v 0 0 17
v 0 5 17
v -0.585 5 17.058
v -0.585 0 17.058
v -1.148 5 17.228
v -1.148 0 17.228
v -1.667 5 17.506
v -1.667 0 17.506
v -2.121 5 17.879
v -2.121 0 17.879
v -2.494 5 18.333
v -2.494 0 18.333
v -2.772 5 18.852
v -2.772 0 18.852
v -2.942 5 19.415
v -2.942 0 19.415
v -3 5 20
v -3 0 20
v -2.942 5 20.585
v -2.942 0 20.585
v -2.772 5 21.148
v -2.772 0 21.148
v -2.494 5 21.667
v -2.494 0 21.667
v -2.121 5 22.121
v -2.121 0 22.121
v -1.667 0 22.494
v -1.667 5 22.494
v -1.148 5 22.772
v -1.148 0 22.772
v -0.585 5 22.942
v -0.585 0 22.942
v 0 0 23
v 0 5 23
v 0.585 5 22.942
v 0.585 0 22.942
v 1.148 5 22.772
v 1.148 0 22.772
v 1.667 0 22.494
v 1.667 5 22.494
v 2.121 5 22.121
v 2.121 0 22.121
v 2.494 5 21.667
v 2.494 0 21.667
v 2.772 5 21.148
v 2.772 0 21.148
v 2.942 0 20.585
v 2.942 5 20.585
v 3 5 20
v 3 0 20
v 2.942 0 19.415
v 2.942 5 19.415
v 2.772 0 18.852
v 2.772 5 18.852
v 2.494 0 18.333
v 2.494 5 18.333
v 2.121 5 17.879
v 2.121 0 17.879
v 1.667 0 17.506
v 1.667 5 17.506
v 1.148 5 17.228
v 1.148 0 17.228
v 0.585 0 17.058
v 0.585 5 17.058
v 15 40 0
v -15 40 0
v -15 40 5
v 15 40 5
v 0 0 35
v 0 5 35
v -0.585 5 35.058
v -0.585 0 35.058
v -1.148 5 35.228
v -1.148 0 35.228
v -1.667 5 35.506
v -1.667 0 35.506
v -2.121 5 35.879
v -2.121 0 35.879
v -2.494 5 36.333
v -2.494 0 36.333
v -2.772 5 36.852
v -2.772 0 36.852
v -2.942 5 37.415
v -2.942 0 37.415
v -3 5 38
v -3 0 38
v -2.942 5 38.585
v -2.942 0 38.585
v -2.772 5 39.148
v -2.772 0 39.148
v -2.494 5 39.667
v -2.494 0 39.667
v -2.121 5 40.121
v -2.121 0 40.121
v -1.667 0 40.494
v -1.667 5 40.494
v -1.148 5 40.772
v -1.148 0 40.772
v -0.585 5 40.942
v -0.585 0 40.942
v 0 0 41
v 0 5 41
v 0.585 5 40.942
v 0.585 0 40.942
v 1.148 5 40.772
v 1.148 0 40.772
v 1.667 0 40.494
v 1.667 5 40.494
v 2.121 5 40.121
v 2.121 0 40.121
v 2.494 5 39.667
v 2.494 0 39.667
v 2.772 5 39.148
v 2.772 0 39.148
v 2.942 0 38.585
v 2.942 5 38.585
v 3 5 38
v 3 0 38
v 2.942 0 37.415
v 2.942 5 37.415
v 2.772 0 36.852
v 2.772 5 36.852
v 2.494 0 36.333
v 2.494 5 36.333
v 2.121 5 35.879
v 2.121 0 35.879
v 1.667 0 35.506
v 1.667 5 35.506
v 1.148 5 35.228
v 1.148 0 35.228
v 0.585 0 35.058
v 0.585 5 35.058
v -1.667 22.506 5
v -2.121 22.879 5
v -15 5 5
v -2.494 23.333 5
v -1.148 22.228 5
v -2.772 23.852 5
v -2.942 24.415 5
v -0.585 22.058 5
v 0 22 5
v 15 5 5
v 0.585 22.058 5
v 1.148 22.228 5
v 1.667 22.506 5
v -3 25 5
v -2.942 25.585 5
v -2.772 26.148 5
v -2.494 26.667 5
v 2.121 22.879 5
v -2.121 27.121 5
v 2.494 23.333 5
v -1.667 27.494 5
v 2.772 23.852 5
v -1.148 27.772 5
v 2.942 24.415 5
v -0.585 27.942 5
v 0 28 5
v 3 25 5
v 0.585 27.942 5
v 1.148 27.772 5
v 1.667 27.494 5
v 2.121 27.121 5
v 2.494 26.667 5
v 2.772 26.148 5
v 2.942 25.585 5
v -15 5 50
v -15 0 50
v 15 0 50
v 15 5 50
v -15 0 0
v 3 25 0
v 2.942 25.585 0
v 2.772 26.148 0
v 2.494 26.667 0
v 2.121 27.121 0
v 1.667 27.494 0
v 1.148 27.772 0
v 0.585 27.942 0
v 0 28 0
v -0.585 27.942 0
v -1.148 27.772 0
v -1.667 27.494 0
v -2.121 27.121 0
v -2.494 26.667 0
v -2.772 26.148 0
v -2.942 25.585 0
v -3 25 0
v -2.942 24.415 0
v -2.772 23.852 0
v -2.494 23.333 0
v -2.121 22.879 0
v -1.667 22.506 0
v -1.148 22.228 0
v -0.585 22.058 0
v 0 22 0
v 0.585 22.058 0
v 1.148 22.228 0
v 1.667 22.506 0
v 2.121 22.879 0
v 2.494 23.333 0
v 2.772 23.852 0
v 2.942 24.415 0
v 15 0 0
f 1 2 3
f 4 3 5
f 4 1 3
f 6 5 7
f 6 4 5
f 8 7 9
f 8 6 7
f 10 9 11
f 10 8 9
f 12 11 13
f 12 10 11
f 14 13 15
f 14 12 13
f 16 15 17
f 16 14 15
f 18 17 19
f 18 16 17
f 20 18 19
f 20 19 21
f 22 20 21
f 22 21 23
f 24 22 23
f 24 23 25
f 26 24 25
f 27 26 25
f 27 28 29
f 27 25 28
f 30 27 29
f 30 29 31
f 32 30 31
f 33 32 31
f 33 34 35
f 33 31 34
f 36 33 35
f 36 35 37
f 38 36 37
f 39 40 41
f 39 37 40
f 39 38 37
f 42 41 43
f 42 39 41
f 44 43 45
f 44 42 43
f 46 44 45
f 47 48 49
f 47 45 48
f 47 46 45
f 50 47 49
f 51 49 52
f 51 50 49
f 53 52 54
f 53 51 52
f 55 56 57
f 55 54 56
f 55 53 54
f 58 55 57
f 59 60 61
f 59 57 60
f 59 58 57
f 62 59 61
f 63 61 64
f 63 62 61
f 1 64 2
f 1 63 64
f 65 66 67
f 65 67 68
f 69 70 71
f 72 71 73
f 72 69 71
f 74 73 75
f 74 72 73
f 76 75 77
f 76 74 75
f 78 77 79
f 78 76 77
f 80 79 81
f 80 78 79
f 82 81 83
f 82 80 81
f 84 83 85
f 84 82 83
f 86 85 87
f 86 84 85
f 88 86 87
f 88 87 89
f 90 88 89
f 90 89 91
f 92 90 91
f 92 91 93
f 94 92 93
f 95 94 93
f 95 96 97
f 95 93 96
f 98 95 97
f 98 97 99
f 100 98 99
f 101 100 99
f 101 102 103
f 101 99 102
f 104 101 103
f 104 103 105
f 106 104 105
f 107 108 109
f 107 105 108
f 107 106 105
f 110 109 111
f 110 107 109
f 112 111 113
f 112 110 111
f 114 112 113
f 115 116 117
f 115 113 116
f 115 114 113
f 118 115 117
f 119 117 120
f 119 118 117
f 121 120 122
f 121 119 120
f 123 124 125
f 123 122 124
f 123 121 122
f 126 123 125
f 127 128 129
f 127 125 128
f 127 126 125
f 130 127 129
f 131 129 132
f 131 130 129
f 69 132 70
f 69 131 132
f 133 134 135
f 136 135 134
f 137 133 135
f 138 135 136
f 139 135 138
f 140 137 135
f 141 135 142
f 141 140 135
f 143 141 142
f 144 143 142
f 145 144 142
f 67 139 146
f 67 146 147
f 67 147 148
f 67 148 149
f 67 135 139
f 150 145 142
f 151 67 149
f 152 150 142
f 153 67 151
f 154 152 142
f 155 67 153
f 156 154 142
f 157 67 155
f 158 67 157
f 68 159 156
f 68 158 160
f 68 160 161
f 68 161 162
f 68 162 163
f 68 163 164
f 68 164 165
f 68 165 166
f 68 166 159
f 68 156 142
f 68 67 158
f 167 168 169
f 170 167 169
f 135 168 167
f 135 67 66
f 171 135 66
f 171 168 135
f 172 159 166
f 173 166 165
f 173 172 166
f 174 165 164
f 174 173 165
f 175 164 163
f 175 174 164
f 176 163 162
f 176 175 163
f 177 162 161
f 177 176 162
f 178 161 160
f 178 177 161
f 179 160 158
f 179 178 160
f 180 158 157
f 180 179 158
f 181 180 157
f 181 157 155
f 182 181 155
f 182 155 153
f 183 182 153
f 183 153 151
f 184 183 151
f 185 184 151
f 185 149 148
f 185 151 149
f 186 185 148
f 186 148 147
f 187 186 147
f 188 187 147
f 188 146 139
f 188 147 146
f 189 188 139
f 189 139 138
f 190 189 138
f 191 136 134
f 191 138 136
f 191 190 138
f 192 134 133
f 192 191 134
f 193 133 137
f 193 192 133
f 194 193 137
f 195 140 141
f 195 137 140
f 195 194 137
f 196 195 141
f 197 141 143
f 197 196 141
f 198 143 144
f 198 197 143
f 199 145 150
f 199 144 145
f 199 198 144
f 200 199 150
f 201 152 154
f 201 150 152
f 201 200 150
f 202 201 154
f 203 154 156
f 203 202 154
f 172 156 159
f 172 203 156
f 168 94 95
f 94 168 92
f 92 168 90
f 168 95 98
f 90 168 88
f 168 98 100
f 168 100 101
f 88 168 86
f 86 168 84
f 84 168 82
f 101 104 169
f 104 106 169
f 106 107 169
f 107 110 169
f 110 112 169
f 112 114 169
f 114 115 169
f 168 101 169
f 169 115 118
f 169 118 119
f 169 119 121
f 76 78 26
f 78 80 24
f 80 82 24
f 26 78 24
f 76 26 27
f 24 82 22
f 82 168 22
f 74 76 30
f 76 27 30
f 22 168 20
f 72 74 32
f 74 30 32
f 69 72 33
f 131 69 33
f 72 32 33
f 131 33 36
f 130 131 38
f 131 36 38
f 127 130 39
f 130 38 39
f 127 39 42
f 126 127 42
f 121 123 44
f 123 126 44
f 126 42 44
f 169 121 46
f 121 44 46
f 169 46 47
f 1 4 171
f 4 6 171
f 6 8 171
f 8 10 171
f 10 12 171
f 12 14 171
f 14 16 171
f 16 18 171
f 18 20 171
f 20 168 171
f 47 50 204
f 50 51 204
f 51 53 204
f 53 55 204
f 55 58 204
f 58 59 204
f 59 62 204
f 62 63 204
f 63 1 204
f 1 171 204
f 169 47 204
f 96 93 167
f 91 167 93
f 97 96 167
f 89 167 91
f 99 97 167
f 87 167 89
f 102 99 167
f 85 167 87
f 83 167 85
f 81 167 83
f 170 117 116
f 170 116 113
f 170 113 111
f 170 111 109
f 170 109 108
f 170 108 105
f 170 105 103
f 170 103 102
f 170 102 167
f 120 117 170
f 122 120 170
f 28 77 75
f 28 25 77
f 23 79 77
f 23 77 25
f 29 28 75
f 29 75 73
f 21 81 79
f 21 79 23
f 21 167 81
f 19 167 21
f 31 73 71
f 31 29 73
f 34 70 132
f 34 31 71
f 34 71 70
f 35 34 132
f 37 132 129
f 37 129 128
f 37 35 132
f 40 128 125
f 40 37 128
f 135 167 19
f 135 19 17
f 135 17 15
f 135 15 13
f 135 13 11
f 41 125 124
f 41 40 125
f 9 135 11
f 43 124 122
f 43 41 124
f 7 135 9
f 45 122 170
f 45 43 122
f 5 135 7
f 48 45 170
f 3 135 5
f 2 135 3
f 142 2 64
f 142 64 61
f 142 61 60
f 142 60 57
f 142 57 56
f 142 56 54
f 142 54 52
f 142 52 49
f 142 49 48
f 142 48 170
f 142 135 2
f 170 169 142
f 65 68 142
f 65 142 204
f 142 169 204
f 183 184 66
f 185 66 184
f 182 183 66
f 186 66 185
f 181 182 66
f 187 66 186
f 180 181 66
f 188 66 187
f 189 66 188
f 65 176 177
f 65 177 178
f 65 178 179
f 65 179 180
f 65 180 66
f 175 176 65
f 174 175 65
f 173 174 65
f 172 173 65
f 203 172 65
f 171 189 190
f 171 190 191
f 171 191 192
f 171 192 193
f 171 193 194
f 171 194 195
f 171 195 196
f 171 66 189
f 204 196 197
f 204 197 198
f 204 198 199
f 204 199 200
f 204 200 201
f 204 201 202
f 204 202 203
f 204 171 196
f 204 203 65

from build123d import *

# Parameters (mm, degrees)
SKETCH_1_W          = 30
SKETCH_1_H          = 50
EXTRUDE_1_DEPTH     = 5
SKETCH_2_W          = 30
SKETCH_2_H          = 40
EXTRUDE_2_DEPTH     = 5
SKETCH_3_R          = 3
CUT_EXTRUDE_1_DEPTH = 66.76473219
SKETCH_4_R          = 3
CUT_EXTRUDE_2_DEPTH = 66.76473219


with BuildPart() as part:
    # 草图1 → 凸台-拉伸1 (new body)
    with BuildSketch(Plane(origin=(0, 0, 0), x_dir=(1, 0, 0), z_dir=(0, 1, 0))):
        with Locations((0, -25)):
            Rectangle(SKETCH_1_W, SKETCH_1_H)
    extrude(amount=EXTRUDE_1_DEPTH)

    # 草图2 → 凸台-拉伸2 (add)
    with BuildSketch(Plane.XY):
        with Locations((0, 20)):
            Rectangle(SKETCH_2_W, SKETCH_2_H)
    extrude(amount=EXTRUDE_2_DEPTH)

    # 草图3 → 切除-拉伸1 (cut, through all)
    with BuildSketch(Plane(origin=(0, 0, 0), x_dir=(1, 0, 0), z_dir=(0, 1, 0))):
        with Locations(Location((0, -20, 0), (0, 0, 90))):
            Circle(SKETCH_3_R)
        with Locations(Location((0, -38, 0), (0, 0, 90))):
            Circle(SKETCH_3_R)
    extrude(amount=CUT_EXTRUDE_1_DEPTH, mode=Mode.SUBTRACT)

    # 草图4 → 切除-拉伸2 (cut, through all)
    with BuildSketch(Plane.XY):
        with Locations((0, 25)):
            Circle(SKETCH_4_R)
    extrude(amount=CUT_EXTRUDE_2_DEPTH, mode=Mode.SUBTRACT)


solid = part.part
